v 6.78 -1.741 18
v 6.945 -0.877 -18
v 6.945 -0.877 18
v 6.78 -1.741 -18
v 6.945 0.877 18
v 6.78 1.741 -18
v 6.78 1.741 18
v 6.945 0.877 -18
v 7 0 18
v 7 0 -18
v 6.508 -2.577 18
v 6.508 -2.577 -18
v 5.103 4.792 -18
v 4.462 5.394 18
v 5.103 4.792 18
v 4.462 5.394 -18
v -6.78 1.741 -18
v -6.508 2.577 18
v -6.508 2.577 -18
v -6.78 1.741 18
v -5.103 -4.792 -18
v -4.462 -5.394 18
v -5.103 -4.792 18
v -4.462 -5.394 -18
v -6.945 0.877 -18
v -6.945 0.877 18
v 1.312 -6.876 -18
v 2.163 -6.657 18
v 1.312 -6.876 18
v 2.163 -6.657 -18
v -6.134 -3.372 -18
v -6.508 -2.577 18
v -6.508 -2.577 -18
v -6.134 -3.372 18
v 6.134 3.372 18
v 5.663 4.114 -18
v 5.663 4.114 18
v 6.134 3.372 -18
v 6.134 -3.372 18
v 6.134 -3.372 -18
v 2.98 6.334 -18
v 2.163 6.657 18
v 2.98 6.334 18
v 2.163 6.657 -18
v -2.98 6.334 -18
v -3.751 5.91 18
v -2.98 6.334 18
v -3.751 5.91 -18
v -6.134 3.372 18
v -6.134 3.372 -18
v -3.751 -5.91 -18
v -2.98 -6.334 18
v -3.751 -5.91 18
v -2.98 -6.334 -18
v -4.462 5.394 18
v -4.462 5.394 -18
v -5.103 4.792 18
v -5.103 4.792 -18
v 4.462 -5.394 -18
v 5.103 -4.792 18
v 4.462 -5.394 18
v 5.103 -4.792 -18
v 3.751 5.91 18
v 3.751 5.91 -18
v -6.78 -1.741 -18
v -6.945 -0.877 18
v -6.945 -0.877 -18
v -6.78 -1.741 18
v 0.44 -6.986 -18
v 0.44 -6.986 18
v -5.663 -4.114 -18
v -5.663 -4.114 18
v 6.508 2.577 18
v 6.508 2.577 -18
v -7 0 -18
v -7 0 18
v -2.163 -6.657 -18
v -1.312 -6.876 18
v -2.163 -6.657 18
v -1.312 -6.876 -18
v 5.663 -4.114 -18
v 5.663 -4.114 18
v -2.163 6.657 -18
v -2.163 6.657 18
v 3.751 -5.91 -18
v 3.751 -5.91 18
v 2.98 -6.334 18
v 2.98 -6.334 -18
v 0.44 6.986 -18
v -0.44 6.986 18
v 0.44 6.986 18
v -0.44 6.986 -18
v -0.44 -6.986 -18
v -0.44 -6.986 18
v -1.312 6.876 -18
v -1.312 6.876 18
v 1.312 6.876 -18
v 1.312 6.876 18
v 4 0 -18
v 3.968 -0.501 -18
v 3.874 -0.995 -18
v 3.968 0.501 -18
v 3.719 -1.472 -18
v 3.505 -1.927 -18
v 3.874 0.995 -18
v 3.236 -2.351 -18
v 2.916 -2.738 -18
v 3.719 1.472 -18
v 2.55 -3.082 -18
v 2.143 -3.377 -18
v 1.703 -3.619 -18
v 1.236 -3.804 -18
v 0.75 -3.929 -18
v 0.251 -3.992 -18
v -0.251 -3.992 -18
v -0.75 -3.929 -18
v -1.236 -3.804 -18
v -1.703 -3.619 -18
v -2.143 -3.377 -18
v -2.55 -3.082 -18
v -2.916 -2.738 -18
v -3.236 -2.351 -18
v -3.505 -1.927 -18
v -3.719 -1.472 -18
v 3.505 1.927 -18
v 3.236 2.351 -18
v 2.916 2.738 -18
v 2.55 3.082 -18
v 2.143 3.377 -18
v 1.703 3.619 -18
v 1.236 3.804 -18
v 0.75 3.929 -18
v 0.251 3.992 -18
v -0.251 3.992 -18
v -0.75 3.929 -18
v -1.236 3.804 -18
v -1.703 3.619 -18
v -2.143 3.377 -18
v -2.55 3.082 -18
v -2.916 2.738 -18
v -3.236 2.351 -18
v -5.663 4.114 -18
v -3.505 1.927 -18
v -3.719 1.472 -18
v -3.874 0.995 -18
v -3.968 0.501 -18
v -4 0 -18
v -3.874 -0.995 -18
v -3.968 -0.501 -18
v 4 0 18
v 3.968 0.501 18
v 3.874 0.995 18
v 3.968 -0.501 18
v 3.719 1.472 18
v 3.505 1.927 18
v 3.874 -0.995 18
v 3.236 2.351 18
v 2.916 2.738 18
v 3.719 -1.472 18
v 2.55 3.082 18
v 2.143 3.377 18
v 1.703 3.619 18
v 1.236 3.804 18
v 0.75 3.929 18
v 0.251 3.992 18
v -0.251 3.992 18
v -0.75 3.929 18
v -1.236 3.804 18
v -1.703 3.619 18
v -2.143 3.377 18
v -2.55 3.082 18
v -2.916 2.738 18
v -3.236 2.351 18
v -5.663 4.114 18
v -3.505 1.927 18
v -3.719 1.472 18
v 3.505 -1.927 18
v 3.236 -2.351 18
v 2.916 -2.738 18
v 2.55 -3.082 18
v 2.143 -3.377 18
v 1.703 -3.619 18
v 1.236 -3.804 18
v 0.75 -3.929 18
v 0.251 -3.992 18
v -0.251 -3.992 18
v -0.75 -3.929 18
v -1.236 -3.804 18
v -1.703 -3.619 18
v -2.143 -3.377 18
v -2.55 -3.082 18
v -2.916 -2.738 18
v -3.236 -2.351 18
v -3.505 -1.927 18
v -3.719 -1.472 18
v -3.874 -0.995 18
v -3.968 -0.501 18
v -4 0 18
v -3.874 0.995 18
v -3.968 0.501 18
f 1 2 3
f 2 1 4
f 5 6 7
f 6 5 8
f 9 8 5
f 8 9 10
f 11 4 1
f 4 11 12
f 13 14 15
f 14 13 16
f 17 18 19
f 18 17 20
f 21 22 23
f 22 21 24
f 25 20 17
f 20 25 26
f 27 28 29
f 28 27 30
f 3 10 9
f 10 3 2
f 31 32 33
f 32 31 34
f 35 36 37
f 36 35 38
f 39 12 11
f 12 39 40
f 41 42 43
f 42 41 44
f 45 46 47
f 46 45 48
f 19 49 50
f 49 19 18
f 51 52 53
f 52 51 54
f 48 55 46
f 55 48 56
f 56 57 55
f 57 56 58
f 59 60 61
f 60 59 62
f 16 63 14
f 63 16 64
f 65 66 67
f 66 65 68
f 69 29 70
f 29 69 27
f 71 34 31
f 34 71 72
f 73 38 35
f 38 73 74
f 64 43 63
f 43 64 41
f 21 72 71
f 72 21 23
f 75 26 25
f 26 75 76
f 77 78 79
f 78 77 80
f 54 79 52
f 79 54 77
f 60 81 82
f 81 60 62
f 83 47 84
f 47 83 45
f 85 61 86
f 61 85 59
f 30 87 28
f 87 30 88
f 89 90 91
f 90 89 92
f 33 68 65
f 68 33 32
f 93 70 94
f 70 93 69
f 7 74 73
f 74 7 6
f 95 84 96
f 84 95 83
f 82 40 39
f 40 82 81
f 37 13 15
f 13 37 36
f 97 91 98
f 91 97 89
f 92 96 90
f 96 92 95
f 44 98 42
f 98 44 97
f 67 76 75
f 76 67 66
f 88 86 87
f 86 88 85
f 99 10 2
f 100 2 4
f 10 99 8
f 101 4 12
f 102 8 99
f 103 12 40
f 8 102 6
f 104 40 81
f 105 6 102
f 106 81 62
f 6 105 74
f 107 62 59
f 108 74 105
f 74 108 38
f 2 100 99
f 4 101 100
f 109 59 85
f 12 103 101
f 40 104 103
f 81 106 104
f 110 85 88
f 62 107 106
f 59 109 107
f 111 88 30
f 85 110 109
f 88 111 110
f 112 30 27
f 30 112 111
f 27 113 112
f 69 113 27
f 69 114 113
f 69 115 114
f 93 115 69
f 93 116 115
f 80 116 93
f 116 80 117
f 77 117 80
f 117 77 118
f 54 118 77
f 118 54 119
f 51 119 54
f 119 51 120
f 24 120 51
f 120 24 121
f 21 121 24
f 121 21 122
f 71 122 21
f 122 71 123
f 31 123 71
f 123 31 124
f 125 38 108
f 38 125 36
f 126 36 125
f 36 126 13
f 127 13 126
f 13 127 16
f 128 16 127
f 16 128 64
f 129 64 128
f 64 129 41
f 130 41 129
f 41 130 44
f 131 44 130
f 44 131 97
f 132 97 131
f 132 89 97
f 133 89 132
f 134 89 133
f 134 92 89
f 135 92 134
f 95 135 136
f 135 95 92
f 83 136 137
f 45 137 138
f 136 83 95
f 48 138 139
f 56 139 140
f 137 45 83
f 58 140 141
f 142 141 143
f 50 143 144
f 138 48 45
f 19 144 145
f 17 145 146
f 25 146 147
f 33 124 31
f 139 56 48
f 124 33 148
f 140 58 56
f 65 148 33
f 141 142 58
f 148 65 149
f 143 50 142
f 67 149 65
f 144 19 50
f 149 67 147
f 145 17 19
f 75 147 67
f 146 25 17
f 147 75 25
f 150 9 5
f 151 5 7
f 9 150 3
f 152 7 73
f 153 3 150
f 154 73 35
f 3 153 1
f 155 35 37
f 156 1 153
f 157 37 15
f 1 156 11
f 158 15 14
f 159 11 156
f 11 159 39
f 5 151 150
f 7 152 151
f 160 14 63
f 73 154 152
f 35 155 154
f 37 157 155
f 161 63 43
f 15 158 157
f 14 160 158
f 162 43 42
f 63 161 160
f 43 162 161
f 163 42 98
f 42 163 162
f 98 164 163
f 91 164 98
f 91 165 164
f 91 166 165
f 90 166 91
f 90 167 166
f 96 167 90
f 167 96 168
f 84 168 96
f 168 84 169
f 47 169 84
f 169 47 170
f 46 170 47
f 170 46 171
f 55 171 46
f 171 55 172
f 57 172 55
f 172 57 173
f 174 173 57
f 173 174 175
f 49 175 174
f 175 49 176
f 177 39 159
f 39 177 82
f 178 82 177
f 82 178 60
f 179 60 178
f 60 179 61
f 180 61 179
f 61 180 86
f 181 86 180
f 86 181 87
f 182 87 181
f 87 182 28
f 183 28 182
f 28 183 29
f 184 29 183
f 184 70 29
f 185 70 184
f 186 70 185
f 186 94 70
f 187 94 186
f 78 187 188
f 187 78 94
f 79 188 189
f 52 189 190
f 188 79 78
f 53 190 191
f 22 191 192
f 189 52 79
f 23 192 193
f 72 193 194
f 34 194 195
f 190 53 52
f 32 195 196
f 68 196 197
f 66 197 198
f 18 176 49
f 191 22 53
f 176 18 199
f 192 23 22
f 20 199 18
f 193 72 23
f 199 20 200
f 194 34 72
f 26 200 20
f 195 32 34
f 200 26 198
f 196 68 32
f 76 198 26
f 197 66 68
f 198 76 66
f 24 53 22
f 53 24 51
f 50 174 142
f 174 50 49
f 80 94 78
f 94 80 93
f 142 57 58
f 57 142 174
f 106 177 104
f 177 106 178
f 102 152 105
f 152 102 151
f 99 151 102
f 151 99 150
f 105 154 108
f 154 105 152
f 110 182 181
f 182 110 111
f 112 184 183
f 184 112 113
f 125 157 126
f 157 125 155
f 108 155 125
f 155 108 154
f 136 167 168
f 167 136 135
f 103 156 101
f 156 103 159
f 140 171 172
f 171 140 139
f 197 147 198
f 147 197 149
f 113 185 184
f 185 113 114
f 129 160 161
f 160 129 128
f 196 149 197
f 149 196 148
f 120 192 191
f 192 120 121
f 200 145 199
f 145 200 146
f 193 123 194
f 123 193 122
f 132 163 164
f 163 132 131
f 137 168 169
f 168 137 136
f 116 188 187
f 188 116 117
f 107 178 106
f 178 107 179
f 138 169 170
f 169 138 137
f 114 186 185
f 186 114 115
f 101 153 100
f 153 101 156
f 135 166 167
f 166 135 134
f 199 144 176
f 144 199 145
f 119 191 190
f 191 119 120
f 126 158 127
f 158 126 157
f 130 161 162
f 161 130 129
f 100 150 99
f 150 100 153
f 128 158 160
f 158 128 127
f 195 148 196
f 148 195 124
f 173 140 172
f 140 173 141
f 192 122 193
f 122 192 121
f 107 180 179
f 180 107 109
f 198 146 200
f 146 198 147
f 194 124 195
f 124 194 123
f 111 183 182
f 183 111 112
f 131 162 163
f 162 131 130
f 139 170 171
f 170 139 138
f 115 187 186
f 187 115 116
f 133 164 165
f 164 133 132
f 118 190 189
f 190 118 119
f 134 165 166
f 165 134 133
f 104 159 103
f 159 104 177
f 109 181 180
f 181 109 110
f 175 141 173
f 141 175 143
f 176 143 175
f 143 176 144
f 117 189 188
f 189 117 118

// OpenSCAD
$fn = 50;


difference() {
	union() {
		translate(v = [0, 0, -18.0000000000]) {
			cylinder(h = 36, r = 7.0000000000);
		}
	}
	union() {
		translate(v = [0, 0, -100.0000000000]) {
			cylinder(h = 200, r = 4.0000000000);
		}
	}
}
